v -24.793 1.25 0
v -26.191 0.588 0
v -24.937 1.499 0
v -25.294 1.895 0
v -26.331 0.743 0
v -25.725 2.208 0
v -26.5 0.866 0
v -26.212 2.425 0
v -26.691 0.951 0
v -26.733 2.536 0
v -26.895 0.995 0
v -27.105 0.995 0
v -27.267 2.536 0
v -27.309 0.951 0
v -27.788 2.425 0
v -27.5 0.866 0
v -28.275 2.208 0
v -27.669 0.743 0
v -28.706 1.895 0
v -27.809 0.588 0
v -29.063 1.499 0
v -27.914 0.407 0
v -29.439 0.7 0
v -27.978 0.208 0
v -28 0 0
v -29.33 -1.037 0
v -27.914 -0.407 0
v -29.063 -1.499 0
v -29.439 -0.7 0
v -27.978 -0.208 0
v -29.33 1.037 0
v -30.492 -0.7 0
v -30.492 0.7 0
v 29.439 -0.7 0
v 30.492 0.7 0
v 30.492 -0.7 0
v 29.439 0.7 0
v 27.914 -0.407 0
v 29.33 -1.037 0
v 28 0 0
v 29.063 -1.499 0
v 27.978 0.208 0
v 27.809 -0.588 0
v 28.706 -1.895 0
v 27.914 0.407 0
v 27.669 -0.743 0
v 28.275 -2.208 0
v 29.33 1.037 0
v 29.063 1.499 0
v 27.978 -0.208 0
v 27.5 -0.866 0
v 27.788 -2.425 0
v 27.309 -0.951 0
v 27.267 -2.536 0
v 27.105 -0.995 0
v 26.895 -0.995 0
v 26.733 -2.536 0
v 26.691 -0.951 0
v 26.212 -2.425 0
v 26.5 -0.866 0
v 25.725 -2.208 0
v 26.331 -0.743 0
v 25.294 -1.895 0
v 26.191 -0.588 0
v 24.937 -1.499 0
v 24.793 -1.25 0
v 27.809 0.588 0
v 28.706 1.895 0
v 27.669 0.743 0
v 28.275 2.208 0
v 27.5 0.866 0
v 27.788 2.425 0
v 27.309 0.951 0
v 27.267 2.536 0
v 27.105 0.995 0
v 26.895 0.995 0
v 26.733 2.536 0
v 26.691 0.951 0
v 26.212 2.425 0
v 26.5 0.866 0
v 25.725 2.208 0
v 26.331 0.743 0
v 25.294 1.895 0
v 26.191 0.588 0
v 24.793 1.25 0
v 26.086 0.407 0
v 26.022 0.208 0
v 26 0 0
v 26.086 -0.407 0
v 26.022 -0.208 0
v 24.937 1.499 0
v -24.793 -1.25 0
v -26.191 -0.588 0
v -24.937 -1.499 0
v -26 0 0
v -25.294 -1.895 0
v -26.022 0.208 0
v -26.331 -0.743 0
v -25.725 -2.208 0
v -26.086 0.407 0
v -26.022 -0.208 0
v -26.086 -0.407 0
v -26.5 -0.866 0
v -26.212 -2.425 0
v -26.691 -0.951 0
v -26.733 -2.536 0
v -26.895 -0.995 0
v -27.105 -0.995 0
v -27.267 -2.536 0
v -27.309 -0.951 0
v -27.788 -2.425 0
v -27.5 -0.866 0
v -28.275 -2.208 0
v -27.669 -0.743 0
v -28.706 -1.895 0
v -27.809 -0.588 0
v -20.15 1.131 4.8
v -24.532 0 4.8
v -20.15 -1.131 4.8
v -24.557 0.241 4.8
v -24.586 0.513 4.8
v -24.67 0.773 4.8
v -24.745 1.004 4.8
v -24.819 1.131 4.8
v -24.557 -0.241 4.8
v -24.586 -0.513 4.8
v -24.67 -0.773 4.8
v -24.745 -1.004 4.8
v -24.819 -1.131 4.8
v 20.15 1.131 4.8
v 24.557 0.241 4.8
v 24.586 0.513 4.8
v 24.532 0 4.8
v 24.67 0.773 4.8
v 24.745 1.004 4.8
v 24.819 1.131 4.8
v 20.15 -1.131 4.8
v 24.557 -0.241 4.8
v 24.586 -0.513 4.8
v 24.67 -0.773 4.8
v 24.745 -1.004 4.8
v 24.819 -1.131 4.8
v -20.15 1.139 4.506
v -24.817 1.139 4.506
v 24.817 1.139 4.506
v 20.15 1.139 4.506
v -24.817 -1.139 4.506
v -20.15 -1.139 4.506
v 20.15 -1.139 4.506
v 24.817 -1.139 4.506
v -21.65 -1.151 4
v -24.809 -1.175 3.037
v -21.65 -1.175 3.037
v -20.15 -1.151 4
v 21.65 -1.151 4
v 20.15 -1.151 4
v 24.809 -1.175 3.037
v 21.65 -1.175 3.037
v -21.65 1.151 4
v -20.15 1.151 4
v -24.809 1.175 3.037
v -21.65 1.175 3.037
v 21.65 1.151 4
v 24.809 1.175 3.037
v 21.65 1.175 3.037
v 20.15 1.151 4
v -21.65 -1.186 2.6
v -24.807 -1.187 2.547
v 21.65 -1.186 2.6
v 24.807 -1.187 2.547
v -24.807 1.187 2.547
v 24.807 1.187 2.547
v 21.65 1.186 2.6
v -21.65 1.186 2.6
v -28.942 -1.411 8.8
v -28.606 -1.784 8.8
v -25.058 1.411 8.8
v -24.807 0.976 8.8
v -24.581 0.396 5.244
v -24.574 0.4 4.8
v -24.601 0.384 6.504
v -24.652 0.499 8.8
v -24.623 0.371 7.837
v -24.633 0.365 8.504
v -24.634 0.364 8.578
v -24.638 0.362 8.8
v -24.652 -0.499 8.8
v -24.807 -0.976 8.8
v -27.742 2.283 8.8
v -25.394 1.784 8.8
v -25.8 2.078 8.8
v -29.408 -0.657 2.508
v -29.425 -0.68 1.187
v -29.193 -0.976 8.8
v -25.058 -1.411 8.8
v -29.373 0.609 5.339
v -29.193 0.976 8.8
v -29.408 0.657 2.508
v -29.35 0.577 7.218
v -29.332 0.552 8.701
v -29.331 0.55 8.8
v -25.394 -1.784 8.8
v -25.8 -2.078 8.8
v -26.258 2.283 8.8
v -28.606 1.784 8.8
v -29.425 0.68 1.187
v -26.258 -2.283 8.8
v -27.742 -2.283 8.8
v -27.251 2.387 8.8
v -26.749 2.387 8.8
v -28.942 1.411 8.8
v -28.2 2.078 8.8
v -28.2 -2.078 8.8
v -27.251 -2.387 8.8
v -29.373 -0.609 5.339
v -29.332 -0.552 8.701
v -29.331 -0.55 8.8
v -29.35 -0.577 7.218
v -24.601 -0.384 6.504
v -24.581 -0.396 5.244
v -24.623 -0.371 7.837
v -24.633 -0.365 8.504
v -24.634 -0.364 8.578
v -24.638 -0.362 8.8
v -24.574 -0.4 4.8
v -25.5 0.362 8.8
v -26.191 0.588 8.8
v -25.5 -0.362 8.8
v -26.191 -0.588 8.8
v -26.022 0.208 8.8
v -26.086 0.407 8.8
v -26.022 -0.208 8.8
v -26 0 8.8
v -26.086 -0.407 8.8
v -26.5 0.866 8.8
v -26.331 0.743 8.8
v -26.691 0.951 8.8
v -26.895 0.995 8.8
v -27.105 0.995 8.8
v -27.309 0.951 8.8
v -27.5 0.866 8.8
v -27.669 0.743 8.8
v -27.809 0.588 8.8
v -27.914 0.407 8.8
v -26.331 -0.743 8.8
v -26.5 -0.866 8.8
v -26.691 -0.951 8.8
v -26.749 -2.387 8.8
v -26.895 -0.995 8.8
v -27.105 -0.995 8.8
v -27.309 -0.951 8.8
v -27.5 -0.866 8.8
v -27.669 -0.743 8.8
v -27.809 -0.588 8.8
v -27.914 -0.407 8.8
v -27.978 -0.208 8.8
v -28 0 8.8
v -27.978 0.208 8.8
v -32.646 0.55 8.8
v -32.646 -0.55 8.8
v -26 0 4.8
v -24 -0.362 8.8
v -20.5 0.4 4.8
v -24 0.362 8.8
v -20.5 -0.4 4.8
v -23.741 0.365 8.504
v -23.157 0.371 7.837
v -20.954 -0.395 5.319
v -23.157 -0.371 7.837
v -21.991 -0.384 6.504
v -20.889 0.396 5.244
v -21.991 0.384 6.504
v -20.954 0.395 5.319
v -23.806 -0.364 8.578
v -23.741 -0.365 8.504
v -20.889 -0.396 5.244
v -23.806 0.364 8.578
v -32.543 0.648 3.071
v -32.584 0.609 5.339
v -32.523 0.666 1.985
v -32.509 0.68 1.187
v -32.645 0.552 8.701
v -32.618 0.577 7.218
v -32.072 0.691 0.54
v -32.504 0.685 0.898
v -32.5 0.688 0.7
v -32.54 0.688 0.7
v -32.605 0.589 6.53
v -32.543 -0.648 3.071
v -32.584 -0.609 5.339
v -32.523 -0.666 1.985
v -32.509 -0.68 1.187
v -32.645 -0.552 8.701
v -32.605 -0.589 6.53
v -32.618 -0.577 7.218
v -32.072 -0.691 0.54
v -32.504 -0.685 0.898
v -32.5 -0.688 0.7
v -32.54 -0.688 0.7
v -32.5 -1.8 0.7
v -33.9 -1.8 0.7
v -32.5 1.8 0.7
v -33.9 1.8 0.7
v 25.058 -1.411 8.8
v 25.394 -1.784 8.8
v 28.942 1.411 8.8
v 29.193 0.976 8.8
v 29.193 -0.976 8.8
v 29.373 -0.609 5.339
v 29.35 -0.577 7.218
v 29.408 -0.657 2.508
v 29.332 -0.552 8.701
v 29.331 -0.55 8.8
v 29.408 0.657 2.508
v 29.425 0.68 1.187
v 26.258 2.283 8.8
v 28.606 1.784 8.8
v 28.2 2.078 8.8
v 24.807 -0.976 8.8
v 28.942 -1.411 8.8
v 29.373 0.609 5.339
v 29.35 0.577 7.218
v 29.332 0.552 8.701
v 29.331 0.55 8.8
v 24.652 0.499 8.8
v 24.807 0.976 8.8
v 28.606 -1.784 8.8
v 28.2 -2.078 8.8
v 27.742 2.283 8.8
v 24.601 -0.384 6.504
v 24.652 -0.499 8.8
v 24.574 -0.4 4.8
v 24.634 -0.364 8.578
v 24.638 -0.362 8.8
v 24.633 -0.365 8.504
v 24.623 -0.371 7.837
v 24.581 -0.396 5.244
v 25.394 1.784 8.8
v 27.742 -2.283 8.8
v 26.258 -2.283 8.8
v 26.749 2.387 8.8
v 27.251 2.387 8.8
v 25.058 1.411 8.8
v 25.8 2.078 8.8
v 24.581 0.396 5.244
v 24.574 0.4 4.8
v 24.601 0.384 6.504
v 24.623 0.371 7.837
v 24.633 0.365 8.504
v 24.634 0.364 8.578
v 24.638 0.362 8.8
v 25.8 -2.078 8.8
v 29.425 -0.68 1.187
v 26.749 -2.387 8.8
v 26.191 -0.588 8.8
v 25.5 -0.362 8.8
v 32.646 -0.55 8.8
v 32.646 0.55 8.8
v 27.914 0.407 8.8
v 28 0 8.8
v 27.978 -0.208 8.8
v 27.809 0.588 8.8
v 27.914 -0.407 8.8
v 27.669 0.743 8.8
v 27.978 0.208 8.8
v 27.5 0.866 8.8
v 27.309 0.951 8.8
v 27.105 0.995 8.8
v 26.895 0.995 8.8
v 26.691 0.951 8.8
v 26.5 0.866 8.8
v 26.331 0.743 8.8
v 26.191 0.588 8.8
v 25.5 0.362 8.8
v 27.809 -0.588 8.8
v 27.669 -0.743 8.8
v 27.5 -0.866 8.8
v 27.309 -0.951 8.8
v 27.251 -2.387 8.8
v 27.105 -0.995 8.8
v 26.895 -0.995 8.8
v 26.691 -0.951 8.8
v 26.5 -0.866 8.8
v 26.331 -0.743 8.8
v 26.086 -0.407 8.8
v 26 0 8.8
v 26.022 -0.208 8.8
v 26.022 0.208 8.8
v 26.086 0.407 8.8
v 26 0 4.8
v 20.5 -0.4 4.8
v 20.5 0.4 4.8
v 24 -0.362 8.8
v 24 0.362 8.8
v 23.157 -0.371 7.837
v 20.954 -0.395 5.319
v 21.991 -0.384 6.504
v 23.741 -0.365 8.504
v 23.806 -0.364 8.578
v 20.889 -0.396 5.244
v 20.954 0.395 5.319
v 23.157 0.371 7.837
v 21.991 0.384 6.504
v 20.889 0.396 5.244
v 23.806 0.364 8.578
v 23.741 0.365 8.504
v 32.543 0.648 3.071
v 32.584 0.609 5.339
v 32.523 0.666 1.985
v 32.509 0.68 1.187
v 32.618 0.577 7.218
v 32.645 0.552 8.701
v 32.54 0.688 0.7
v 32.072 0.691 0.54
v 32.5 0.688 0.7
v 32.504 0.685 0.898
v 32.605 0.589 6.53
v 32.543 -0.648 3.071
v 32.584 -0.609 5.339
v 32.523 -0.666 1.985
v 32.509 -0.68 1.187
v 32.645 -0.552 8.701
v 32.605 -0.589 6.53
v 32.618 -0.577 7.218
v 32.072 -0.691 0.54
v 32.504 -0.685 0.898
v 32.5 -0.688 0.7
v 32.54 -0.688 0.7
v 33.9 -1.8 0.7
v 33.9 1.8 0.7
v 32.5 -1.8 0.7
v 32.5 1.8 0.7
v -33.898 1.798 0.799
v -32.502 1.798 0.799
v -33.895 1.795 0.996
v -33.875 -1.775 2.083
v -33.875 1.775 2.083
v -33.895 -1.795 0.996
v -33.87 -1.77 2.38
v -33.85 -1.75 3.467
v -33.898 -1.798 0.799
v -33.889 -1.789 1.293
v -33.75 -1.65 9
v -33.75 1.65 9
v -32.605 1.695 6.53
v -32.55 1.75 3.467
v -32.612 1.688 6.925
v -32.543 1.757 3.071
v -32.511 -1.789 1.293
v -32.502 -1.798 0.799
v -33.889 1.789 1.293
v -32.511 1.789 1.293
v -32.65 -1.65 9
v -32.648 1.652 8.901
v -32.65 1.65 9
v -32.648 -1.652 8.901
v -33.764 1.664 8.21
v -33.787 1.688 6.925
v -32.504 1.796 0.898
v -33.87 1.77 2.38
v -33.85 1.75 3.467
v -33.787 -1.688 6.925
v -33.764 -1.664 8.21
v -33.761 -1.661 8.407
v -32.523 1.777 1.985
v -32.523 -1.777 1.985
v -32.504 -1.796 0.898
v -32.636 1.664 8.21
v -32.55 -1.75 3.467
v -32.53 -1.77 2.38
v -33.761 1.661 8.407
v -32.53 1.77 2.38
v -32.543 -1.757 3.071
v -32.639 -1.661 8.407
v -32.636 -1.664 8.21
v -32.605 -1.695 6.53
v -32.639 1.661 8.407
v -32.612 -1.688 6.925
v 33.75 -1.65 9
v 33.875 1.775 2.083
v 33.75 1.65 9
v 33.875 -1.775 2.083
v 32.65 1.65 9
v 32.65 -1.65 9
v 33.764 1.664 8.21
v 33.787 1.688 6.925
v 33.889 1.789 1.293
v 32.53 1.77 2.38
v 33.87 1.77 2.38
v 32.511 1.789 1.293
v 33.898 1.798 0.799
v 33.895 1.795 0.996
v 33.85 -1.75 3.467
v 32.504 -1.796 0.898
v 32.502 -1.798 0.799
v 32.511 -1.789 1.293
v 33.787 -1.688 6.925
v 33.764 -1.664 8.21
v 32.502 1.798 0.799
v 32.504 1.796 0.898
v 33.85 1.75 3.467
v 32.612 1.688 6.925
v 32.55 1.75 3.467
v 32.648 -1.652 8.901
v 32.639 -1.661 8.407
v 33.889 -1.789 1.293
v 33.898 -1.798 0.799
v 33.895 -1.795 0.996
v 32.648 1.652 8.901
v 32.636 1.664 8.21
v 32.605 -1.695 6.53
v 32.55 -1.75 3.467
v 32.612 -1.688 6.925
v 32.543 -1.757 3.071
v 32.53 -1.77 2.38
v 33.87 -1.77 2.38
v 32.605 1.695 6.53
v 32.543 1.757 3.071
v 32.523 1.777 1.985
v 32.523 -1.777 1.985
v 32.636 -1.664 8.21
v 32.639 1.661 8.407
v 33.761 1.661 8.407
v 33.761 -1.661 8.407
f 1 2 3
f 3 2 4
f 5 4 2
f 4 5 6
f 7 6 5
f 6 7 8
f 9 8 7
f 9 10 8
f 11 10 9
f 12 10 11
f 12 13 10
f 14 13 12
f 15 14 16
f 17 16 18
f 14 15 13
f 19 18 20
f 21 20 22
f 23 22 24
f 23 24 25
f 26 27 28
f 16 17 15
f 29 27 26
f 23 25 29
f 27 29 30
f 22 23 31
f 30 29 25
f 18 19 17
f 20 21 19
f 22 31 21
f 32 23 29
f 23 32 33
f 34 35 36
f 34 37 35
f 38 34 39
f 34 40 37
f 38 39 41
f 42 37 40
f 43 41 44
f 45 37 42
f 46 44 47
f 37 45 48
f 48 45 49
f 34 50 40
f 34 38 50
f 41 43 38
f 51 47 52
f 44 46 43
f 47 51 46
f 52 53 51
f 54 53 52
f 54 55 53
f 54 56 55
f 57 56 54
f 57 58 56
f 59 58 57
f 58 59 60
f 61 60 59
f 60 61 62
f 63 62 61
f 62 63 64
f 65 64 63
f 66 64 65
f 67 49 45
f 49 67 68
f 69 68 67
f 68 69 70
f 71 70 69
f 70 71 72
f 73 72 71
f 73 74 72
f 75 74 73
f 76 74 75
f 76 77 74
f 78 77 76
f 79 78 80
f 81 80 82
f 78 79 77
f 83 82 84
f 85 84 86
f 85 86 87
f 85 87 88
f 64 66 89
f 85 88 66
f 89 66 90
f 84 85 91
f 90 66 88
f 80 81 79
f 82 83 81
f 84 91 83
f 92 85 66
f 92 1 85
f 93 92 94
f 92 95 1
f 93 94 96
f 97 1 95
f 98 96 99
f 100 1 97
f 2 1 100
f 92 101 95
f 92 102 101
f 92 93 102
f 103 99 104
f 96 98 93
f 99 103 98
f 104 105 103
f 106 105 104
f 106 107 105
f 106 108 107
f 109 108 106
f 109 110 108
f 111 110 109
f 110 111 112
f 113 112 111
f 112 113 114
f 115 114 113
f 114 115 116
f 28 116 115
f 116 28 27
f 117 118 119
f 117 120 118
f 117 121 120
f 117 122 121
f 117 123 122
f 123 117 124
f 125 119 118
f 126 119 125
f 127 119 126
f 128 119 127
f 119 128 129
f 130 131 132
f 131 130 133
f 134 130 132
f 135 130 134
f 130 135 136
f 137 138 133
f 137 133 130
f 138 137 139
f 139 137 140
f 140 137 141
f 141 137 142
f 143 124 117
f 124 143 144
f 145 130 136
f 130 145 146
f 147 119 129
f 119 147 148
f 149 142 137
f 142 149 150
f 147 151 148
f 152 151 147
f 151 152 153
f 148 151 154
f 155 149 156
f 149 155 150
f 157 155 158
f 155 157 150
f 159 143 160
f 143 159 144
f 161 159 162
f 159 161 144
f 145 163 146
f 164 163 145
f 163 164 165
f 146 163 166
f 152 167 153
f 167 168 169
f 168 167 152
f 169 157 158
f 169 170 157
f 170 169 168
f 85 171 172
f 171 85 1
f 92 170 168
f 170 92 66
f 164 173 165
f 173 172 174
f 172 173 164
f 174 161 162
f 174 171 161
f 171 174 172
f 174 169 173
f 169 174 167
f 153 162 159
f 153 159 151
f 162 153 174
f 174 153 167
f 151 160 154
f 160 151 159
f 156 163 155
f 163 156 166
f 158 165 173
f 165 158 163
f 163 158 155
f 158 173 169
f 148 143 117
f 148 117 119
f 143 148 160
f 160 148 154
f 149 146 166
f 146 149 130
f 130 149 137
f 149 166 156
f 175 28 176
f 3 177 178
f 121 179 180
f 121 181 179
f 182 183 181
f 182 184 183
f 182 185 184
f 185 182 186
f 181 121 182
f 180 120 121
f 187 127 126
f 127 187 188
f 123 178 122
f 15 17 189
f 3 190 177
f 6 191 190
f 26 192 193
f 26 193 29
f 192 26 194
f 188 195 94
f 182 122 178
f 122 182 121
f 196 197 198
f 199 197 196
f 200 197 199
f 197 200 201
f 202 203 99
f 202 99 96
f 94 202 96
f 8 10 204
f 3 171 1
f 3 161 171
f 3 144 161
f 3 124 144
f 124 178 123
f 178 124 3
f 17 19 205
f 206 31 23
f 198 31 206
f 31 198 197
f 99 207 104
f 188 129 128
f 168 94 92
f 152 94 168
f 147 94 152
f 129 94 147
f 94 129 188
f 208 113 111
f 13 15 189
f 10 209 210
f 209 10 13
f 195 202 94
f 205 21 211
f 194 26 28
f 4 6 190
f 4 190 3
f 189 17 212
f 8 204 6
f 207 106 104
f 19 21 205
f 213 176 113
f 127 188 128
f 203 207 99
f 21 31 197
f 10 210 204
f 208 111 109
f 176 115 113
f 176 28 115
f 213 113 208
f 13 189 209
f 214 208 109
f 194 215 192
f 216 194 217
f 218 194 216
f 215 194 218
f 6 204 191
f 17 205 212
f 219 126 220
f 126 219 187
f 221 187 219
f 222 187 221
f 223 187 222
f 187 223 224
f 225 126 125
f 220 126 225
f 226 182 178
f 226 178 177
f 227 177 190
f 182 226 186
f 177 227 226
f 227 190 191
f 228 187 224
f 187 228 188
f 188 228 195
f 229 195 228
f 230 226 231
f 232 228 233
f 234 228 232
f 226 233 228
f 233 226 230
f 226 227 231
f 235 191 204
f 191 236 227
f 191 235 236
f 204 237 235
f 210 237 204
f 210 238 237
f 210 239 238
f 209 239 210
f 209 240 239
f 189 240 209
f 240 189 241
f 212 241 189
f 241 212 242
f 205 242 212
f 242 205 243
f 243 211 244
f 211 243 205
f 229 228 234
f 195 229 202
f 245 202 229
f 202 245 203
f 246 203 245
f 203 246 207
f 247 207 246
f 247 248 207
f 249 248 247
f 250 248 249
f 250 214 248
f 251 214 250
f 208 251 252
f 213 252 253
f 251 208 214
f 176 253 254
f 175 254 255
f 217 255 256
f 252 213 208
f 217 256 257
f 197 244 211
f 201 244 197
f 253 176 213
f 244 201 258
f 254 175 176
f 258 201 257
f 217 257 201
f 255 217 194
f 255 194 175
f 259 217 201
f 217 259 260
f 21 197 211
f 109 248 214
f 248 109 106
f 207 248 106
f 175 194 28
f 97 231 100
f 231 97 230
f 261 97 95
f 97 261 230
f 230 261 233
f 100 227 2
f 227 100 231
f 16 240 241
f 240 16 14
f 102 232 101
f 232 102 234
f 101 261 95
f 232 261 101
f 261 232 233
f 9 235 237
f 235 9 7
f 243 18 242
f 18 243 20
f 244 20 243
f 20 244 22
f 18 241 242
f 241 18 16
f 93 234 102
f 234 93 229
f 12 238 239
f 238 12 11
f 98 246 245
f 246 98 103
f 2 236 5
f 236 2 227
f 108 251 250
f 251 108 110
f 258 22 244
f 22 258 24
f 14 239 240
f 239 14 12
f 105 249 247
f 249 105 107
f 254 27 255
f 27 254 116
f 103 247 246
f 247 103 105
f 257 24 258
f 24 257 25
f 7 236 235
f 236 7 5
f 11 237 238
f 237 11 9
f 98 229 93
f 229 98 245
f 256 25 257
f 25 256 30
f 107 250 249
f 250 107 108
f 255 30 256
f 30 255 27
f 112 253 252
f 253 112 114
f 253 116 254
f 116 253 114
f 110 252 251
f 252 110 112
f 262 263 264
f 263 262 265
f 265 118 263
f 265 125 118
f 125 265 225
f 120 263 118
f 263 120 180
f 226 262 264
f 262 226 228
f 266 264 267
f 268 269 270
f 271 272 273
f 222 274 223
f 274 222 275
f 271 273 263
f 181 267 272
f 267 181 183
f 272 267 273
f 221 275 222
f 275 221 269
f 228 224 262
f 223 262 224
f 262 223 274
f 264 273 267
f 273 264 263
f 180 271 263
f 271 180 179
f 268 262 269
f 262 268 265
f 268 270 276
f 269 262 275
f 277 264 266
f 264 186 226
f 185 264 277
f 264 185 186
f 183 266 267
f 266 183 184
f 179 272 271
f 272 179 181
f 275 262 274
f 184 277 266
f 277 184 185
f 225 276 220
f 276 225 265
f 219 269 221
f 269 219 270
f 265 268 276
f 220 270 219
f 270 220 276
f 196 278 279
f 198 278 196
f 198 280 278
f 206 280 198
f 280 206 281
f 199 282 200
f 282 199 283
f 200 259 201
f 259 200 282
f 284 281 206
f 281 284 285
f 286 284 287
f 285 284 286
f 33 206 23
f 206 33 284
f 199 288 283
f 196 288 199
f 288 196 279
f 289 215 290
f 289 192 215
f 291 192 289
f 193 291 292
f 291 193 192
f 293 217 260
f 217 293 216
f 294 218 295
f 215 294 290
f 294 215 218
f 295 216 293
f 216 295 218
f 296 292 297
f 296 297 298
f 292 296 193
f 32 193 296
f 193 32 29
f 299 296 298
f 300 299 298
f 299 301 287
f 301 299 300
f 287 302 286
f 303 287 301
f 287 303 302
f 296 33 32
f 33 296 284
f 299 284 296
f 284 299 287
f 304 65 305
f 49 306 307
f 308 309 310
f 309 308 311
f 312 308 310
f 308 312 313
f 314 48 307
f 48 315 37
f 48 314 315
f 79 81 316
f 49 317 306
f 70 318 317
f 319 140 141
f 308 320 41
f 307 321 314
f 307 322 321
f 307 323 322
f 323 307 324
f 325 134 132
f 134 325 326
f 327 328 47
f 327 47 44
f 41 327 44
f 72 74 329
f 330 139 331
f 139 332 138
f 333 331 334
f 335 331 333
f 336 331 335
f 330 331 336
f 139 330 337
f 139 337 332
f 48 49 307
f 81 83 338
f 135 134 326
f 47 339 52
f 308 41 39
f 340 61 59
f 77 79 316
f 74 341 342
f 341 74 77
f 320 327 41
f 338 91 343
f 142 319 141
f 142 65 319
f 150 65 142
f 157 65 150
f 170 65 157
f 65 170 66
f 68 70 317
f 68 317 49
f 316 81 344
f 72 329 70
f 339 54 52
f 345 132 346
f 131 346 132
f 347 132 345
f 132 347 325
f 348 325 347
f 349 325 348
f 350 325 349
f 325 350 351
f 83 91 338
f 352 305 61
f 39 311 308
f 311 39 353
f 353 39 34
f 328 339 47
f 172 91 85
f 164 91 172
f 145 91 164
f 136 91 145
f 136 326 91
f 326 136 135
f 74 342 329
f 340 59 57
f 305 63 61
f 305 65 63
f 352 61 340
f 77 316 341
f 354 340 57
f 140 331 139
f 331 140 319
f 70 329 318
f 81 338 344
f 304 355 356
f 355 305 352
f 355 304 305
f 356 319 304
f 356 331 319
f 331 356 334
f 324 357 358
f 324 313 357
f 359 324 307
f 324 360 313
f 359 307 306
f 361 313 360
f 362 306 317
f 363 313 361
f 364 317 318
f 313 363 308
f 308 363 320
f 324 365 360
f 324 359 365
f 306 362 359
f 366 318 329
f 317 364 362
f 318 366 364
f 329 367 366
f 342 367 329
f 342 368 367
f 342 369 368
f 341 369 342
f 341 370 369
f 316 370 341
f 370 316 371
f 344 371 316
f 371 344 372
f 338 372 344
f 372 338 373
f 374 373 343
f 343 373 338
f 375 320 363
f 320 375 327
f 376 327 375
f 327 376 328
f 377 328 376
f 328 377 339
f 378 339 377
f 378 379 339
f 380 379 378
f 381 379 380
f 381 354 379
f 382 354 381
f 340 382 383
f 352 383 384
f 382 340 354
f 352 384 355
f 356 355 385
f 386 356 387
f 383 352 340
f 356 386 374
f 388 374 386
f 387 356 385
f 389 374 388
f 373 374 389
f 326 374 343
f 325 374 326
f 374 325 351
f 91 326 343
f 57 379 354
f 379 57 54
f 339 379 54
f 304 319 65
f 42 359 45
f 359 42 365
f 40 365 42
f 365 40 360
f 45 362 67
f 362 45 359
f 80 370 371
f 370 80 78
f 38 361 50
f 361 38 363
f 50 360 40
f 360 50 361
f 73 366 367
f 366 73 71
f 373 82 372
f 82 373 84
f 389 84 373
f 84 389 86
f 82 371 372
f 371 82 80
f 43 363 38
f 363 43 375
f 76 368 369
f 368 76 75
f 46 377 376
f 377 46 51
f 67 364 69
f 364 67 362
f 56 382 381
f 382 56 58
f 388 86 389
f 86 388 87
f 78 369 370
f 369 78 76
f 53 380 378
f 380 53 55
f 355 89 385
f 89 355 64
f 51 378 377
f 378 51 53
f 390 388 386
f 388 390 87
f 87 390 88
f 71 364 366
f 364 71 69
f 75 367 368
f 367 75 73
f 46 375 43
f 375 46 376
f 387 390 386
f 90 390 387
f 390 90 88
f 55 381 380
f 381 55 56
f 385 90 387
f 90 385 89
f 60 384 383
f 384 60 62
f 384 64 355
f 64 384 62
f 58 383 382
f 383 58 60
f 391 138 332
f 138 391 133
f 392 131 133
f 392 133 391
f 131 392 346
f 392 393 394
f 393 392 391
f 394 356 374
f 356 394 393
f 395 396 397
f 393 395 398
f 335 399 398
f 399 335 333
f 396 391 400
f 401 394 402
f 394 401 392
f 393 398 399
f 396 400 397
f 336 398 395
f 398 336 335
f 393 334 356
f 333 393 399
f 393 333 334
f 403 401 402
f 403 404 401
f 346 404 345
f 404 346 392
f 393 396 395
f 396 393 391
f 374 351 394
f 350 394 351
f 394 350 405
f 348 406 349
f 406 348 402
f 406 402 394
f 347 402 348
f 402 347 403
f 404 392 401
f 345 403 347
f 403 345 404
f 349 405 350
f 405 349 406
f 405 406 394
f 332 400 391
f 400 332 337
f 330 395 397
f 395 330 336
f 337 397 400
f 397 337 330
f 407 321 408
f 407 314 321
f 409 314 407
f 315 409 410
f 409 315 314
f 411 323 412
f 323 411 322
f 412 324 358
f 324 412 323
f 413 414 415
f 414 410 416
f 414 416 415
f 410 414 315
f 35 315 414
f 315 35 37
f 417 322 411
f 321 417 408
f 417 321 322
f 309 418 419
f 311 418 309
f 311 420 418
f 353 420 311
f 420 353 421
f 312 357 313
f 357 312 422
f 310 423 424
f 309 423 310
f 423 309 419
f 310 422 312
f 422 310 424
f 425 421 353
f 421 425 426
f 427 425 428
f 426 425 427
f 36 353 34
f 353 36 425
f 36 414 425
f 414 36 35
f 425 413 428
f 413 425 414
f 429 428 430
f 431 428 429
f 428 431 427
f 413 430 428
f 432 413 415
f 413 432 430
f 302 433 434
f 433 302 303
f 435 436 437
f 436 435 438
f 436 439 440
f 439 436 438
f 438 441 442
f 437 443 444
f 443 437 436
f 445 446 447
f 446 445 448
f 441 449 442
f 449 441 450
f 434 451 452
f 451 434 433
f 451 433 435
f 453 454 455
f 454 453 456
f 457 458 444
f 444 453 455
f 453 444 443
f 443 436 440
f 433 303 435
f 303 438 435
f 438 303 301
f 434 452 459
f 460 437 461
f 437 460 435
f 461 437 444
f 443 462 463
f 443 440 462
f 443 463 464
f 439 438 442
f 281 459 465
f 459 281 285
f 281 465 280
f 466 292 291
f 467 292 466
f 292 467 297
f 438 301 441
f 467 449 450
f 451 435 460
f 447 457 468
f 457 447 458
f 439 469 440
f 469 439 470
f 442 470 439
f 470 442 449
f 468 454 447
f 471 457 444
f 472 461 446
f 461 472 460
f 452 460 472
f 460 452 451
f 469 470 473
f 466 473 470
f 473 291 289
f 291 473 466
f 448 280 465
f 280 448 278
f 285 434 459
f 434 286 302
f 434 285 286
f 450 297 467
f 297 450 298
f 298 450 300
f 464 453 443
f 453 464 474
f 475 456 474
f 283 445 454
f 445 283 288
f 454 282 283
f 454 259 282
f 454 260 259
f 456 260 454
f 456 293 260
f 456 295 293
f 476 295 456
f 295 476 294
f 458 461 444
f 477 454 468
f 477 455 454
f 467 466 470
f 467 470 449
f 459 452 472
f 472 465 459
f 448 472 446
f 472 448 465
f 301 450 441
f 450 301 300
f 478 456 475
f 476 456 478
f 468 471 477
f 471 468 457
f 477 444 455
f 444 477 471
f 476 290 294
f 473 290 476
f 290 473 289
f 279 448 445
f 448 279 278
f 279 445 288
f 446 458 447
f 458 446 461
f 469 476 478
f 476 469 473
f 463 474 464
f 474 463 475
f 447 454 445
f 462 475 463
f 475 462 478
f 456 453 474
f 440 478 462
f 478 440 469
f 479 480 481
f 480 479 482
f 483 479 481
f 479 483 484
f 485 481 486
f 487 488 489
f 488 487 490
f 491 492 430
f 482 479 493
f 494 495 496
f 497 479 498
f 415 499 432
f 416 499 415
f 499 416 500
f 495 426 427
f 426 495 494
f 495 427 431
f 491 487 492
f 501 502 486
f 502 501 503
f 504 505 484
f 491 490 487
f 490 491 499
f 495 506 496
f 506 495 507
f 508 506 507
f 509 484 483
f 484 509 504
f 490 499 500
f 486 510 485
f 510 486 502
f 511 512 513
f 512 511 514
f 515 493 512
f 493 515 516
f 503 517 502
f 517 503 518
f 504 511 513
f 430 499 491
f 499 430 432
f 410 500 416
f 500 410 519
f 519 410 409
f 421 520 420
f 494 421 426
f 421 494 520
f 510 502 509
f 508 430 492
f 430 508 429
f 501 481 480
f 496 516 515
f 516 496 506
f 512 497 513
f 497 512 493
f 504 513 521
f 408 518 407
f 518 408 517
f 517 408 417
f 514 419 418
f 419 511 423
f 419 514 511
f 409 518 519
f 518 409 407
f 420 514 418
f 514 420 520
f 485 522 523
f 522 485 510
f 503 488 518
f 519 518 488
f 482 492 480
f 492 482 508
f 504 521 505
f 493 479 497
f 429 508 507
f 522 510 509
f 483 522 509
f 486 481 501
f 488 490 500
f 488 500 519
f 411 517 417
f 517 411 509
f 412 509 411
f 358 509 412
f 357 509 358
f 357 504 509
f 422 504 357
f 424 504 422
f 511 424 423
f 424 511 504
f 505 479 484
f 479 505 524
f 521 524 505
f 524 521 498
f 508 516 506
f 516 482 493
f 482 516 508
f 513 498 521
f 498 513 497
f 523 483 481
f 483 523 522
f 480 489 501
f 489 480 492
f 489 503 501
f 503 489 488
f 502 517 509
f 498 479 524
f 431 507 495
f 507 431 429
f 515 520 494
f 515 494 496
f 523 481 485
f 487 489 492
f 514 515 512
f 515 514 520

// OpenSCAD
// PowerBook 5xx daughterboard guide
// Copyright François Revol, 2025

/* [Printing options] */

// Optimize for FDM printers (less supports, larger details) - UNIMPLEMENTED
optimize_fdm = true;

/* [Preview] */


/* [Hidden] */
$fs=0.1;

module pb5xx_daughterboard_guide() {
    difference() {
        linear_extrude(4.8, scale=[1,0.905]) square([52,2.5], center=true);
        translate([0,0,2.6]) linear_extrude(1.4) square([43.3,5], center=true);
        translate([0,0,2.6]) linear_extrude(4) square([40.3,5], center=true);
    }
    for (dx=[-1,1]) {
        // screw post
        translate([dx*54/2,0,0]) difference() {
            cylinder(d1=5.1,d2=4.8,h=8.8);
            translate([0,0,-1]) cylinder(d=2,h=10);
        }
        translate([dx*51/2,0,4.8]) difference() {
            linear_extrude(4, scale=[0.3,0.905]) square([10,0.8], center=true);
            translate([dx*10/2,0,0]) cube(10, center=true);
        }
        translate([dx*62/2,0,0]) difference() {
            linear_extrude(8.8, scale=[1,1.1/1.4]) square([3.5,1.4], center=true);
            translate([dx*1.8,0,-0.1]) linear_extrude(0.8, scale=[0.1,1]) square([5.2,2], center=true);
        }
        translate([dx*(68-1.6)/2,0,0.7])
            linear_extrude(8.3, scale=[1.1/1.4,3.3/3.6]) square([1.4,3.6], center=true);
    }
    //DEBUG:bbox
    //if ($preview) color("green", 0.2) translate([0,0,9/2]) cube([67.8,5.2,9], center=true);
}

pb5xx_daughterboard_guide();
